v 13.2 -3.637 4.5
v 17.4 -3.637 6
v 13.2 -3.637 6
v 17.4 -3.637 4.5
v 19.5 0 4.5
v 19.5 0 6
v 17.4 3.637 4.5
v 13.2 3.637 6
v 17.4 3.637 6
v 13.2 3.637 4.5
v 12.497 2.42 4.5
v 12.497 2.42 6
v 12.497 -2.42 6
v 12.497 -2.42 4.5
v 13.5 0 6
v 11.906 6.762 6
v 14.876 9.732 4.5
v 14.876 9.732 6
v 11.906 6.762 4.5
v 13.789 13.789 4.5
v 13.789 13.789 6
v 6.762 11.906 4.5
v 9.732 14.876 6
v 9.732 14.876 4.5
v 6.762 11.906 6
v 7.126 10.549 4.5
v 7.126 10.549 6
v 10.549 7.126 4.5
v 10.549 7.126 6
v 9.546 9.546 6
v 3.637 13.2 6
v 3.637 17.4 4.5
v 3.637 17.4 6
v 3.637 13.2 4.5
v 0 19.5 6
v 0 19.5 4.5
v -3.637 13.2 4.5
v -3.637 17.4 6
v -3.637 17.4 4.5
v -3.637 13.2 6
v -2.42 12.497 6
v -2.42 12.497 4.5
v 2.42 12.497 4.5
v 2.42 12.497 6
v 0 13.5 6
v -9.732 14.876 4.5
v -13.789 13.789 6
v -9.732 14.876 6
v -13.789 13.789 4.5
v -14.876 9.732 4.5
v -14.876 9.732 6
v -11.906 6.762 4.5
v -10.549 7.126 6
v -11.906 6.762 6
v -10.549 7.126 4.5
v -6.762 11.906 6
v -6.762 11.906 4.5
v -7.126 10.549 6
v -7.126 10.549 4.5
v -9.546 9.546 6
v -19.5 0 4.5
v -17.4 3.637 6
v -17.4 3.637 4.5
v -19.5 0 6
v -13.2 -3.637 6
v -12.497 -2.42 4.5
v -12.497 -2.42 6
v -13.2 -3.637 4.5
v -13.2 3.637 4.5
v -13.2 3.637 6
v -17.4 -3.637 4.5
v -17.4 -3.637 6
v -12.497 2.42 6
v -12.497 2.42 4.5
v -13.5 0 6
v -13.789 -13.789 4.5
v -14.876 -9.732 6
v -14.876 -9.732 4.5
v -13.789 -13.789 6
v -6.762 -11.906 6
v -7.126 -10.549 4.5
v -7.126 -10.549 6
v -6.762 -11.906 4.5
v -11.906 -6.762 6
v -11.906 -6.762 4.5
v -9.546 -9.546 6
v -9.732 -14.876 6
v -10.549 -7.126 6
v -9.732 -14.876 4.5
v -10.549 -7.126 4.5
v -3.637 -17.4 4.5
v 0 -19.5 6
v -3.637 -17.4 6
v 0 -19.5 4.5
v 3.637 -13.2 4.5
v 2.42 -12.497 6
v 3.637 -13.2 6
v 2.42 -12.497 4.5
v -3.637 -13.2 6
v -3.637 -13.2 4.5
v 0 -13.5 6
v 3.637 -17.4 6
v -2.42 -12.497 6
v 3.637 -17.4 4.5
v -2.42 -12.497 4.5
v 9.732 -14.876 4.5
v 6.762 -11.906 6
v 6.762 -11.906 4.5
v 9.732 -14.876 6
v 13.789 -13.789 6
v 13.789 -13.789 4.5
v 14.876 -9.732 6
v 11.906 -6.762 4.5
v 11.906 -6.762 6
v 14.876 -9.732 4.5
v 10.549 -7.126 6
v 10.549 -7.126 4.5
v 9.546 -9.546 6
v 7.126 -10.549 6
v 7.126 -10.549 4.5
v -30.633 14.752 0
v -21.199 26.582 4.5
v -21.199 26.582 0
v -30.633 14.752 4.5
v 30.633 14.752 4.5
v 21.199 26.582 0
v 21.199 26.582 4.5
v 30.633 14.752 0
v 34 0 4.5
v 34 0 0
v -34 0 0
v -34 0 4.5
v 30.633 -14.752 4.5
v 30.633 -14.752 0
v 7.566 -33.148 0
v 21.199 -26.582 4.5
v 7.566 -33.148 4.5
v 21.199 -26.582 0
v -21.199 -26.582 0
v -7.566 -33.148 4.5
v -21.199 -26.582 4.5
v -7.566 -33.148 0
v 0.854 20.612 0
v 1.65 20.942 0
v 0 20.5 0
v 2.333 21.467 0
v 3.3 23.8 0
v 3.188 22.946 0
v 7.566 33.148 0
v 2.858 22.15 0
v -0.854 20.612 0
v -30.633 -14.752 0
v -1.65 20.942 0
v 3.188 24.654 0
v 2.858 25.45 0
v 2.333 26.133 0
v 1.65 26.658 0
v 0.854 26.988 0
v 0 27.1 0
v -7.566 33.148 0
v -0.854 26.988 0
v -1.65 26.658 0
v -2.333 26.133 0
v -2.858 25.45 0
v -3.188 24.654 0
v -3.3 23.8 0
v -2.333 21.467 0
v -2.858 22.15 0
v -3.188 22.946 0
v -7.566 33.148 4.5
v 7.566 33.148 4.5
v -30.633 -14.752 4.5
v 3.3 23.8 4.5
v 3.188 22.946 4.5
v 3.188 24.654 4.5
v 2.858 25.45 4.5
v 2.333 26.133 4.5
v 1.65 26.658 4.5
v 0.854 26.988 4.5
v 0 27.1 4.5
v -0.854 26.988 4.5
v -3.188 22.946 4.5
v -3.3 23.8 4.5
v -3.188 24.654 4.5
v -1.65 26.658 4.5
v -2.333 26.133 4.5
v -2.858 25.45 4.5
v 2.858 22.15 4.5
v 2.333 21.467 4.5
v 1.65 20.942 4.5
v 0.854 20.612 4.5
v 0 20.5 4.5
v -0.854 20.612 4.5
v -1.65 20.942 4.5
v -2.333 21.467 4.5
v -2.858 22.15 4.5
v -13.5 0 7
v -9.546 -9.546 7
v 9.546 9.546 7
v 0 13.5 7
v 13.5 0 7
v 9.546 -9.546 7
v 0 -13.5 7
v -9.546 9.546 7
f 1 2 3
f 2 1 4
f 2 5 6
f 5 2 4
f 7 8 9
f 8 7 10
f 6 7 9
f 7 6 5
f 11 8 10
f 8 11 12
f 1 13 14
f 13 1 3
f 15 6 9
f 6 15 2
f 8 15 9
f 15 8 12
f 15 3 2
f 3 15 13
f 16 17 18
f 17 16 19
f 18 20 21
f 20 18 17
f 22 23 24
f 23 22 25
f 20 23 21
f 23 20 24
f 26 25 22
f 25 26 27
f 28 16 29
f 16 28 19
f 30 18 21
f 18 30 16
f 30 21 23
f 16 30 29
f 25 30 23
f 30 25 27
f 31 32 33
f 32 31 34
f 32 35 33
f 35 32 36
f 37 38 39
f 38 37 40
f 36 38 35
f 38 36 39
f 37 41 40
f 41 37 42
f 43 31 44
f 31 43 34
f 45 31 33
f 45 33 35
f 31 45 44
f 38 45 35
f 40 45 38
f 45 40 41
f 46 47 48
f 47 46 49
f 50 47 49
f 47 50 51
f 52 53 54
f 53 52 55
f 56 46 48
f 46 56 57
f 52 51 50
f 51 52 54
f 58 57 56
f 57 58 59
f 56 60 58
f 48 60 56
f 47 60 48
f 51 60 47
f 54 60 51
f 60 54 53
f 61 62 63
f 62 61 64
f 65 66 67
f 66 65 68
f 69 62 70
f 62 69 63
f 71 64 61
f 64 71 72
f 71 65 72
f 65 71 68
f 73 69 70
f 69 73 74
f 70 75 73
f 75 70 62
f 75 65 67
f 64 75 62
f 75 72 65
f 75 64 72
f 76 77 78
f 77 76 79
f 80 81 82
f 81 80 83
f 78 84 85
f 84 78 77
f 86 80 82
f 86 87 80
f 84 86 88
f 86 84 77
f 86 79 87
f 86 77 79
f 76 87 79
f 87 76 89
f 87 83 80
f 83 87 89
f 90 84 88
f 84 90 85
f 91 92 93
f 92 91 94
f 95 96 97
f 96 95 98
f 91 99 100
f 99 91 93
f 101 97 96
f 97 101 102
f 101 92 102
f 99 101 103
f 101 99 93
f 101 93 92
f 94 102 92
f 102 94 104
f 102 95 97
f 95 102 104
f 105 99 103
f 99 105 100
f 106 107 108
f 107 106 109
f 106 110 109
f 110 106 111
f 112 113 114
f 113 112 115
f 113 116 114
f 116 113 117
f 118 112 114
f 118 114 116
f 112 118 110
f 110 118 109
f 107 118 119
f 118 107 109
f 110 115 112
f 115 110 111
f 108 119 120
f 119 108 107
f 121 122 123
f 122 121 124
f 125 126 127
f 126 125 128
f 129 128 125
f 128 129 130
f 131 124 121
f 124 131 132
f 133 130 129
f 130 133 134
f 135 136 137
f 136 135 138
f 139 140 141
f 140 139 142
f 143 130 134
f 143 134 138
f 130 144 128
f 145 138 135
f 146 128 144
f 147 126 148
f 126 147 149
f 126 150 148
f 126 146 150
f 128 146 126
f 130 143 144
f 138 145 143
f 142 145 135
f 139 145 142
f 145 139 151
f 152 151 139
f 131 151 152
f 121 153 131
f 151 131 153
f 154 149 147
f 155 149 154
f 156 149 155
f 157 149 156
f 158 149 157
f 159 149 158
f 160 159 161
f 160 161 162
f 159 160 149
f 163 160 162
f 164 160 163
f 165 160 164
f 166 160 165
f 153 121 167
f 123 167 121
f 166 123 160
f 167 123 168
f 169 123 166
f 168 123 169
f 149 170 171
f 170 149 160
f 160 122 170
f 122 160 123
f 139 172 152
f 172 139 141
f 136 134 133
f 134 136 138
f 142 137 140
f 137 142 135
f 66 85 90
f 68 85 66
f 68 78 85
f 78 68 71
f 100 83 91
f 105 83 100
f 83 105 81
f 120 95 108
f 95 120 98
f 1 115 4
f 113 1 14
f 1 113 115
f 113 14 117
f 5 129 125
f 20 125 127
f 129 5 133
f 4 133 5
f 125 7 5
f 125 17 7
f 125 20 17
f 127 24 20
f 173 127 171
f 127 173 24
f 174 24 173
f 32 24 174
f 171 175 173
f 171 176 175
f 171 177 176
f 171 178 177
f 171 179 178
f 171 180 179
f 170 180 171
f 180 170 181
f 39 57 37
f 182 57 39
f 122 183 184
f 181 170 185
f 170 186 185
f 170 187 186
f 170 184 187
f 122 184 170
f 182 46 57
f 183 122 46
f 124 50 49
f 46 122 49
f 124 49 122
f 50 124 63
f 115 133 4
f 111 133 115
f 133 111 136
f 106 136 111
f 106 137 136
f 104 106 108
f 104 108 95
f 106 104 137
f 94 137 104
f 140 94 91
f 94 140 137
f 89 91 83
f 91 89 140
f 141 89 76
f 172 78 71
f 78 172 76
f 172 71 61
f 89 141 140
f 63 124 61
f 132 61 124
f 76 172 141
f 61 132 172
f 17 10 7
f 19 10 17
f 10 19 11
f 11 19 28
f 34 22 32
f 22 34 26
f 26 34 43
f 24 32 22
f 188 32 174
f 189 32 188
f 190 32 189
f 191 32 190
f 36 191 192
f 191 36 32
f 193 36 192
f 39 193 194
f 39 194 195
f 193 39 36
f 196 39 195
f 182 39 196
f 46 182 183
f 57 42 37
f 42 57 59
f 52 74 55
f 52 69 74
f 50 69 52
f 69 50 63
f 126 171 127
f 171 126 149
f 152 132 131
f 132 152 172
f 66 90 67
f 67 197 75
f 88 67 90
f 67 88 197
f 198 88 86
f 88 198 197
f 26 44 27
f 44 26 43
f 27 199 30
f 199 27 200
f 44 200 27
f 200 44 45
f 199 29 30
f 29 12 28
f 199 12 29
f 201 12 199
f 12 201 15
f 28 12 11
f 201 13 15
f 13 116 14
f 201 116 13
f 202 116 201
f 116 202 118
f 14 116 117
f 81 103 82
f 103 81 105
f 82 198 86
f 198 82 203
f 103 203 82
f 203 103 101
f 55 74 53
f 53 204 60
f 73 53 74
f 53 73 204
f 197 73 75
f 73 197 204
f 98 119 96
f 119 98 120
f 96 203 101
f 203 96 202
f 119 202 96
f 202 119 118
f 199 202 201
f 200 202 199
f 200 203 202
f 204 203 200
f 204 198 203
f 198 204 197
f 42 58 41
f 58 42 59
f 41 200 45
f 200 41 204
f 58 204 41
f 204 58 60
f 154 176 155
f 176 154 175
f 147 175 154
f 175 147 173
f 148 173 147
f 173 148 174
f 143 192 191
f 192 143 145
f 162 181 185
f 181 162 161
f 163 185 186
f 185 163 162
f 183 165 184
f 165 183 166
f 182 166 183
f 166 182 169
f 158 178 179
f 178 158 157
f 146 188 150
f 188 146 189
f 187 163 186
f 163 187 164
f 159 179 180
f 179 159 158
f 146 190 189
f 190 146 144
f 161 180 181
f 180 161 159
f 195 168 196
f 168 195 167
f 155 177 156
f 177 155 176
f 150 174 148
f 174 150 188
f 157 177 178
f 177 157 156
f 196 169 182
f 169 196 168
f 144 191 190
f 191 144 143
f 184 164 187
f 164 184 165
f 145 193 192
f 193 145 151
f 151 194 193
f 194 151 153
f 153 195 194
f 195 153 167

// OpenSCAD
// file: lib/commerce_forms.scad
// Original parametric printable prototypes. Dimensions in millimeters.
// CAD is the manufacturing authority; Three.js gallery geometry is a stylized preview.
// No external copyrighted silhouettes, brands, logos or character geometry.
$fn=56;
module market_lantern(v=1) {
  r=27+v*2; h=76+v*6; wall=2.8;
  difference() {
    cylinder(r=r,h=h);
    translate([0,0,-1]) cylinder(r=r-wall,h=h+2);
    for (tier=[0:3], j=[0:7+v]) {
      a=360*j/(8+v)+tier*15;
      rotate([0,0,a])
        translate([r-1,0,17+tier*(h-33)/3])
          rotate([0,90,0]) cylinder(r=2.2+(v%3)*.5,h=10,center=true,$fn=18);
    }
  }
}
module market_figurine(v=1) {
  r=18+v;
  union() {
    cylinder(r=29,h=6);
    translate([0,0,7]) scale([1,0.85,1.15]) sphere(r=r);
    translate([0,0,35]) scale([1,.91,.84]) sphere(r=r*.78);
    for (s=[-1,1]) {
      translate([s*(r*.58),0,49])
        rotate([0,s*13,0]) cylinder(r1=5+v*.4,r2=1,h=10+v*2);
      translate([s*(r*.73),-2,20]) scale([.36,.55,.67]) sphere(r=r*.75);
    }
    translate([0,-r*.62,39]) sphere(r=3.5+v*.2);
    for(s=[-1,1])translate([s*7,-r*.72,43])sphere(r=1.8);
  }
}
module market_scenery(v=1) {
  union() {
    translate([-52,-32,0]) cube([104,64,4]);
    for (i=[0:2+v%2]) {
      x=-40+i*24;
      translate([x, -14+(i%2)*12,3.8])
        cube([15+v*2,19,13+v*3]);
      translate([x+2,-13+(i%2)*12,16+v*3])
        cube([11+v*2,15,3]);
    }
    for(i=[-1,1]) {
      translate([i*42,20,3.8]) cylinder(r=5,h=12+v*4);
      translate([i*42,20,15+v*4]) sphere(r=6);
    }
  }
}
module market_organizer(v=1) {
  w=104+v*5;d=69+v*3;h=32+v*3; columns=2+v%3;
  difference() {
    translate([-w/2,-d/2,0]) cube([w,d,h]);
    for(i=[0:columns-1])
      translate([-w/2+3+i*(w-6)/columns,-d/2+3,4])
        cube([(w-6)/columns-3,d-6,h+3]);
  }
}
module market_display(v=1) {
  union() {
    cylinder(r=34+v*2,h=6);
    translate([0,0,5.8]) cylinder(r1=12+v,r2=9,h=26+v*3);
    translate([0,0,30+v*3]) cylinder(r=25+v,h=5);
    for(s=[-1,1])
      translate([s*(16+v),0,34+v*3])
        cube([5,31,10],center=true);
  }
}
module market_gaming(v=1) {
  w=102+v*5;d=66+v*2; h=22+v*3;
  difference() {
    union() {
      translate([-w/2,-d/2,0]) cube([w,d,h]);
      translate([-w/2, d/2-14,h-1]) cube([w,12,15+v]);
    }
    translate([-w/2+5,-d/2+5,5]) cube([w-10,d-24,h+12]);
    for(i=[-1,0,1])
      translate([i*24,d/2-13,h+6]) rotate([90,0,0])
        cylinder(r=3.6+v*.3,h=16,$fn=22);
  }
}
module market_jewelry(v=1) {
  union() {
    translate([-40,-26,0]) cube([80,52,6]);
    for (i=[0:3+v%2]) {
      x=-29+i*58/(3+v%2);
      translate([x,0,5.8]) cylinder(r=3.2,h=42+v*5,$fn=24);
      translate([x,0,46+v*5]) sphere(r=5);
    }
    translate([-33,-5,42+v*5]) cube([66,9,6]);
    for(i=[0:4])translate([-25+i*12,0,46+v*5])
      cylinder(r1=4,r2=1.5,h=7,$fn=20);
  }
}
module market_planter(v=1) {
  r=34+v*2; h=48+v*6; w=3.2;
  difference() {
    union() {
      cylinder(r=r,h=h);
      for(i=[0:9+v])
        rotate([0,0,360*i/(10+v)])
          translate([r-.5,-1.6,2]) cube([2.2,3.2,h-4]);
    }
    translate([0,0,3.8]) cylinder(r=r-w,h=h+2);
    translate([0,0,-1]) cylinder(r=2.8,h=7,$fn=24);
  }
}
module market_gift(v=1,label="CUSTOM") {
  w=100+v*6;d=49+v*3;
  difference() {
    union() {
      hull()for(x=[-w/2+7,w/2-7],y=[-d/2+7,d/2-7])
        translate([x,y,0]) cylinder(r=7,h=6,$fn=24);
      translate([0,0,5.8]) linear_extrude(height=2.2)
        text(label,size=max(9,18-v),halign="center",valign="center",
             font="Liberation Sans:style=Bold");
    }
    if(v==3)for(x=[-w/2+10,w/2-10])
      translate([x,d/2-10,-1]) cylinder(r=2.5,h=10,$fn=24);
  }
}
module market_cosplay(v=1) {
  r=28+v*2;
  difference() {
    union() {
      cylinder(r=r,h=4.5,$fn=8+v*2);
      for(i=[0:4+v])
        rotate([0,0,360*i/(5+v)])
          translate([r*.45,0,4.2]) cylinder(r=4.2,h=1.8,$fn=6);
      cylinder(r=12+v*.5,h=7,$fn=5+v);
    }
    translate([0,r*.70,-1])cylinder(r=3.3,h=10,$fn=24);
  }
}
module commercial_form(family="lantern",variant=1,label="CUSTOM") {
  if(family=="lantern")market_lantern(variant);
  else if(family=="figurine")market_figurine(variant);
  else if(family=="scenery")market_scenery(variant);
  else if(family=="organizer")market_organizer(variant);
  else if(family=="display")market_display(variant);
  else if(family=="gaming")market_gaming(variant);
  else if(family=="jewelry")market_jewelry(variant);
  else if(family=="planter")market_planter(variant);
  else if(family=="gift")market_gift(variant,label);
  else if(family=="cosplay")market_cosplay(variant);
  else assert(false,str("Unknown family: ",family));
}
// main file
// Original 3D printable CAD prototype for Space Explorer Insignia
// Millimeter units; edit parameters and print-test before commercial shipment.
use <lib/commerce_forms.scad>
commercial_form(family="cosplay",variant=3);
